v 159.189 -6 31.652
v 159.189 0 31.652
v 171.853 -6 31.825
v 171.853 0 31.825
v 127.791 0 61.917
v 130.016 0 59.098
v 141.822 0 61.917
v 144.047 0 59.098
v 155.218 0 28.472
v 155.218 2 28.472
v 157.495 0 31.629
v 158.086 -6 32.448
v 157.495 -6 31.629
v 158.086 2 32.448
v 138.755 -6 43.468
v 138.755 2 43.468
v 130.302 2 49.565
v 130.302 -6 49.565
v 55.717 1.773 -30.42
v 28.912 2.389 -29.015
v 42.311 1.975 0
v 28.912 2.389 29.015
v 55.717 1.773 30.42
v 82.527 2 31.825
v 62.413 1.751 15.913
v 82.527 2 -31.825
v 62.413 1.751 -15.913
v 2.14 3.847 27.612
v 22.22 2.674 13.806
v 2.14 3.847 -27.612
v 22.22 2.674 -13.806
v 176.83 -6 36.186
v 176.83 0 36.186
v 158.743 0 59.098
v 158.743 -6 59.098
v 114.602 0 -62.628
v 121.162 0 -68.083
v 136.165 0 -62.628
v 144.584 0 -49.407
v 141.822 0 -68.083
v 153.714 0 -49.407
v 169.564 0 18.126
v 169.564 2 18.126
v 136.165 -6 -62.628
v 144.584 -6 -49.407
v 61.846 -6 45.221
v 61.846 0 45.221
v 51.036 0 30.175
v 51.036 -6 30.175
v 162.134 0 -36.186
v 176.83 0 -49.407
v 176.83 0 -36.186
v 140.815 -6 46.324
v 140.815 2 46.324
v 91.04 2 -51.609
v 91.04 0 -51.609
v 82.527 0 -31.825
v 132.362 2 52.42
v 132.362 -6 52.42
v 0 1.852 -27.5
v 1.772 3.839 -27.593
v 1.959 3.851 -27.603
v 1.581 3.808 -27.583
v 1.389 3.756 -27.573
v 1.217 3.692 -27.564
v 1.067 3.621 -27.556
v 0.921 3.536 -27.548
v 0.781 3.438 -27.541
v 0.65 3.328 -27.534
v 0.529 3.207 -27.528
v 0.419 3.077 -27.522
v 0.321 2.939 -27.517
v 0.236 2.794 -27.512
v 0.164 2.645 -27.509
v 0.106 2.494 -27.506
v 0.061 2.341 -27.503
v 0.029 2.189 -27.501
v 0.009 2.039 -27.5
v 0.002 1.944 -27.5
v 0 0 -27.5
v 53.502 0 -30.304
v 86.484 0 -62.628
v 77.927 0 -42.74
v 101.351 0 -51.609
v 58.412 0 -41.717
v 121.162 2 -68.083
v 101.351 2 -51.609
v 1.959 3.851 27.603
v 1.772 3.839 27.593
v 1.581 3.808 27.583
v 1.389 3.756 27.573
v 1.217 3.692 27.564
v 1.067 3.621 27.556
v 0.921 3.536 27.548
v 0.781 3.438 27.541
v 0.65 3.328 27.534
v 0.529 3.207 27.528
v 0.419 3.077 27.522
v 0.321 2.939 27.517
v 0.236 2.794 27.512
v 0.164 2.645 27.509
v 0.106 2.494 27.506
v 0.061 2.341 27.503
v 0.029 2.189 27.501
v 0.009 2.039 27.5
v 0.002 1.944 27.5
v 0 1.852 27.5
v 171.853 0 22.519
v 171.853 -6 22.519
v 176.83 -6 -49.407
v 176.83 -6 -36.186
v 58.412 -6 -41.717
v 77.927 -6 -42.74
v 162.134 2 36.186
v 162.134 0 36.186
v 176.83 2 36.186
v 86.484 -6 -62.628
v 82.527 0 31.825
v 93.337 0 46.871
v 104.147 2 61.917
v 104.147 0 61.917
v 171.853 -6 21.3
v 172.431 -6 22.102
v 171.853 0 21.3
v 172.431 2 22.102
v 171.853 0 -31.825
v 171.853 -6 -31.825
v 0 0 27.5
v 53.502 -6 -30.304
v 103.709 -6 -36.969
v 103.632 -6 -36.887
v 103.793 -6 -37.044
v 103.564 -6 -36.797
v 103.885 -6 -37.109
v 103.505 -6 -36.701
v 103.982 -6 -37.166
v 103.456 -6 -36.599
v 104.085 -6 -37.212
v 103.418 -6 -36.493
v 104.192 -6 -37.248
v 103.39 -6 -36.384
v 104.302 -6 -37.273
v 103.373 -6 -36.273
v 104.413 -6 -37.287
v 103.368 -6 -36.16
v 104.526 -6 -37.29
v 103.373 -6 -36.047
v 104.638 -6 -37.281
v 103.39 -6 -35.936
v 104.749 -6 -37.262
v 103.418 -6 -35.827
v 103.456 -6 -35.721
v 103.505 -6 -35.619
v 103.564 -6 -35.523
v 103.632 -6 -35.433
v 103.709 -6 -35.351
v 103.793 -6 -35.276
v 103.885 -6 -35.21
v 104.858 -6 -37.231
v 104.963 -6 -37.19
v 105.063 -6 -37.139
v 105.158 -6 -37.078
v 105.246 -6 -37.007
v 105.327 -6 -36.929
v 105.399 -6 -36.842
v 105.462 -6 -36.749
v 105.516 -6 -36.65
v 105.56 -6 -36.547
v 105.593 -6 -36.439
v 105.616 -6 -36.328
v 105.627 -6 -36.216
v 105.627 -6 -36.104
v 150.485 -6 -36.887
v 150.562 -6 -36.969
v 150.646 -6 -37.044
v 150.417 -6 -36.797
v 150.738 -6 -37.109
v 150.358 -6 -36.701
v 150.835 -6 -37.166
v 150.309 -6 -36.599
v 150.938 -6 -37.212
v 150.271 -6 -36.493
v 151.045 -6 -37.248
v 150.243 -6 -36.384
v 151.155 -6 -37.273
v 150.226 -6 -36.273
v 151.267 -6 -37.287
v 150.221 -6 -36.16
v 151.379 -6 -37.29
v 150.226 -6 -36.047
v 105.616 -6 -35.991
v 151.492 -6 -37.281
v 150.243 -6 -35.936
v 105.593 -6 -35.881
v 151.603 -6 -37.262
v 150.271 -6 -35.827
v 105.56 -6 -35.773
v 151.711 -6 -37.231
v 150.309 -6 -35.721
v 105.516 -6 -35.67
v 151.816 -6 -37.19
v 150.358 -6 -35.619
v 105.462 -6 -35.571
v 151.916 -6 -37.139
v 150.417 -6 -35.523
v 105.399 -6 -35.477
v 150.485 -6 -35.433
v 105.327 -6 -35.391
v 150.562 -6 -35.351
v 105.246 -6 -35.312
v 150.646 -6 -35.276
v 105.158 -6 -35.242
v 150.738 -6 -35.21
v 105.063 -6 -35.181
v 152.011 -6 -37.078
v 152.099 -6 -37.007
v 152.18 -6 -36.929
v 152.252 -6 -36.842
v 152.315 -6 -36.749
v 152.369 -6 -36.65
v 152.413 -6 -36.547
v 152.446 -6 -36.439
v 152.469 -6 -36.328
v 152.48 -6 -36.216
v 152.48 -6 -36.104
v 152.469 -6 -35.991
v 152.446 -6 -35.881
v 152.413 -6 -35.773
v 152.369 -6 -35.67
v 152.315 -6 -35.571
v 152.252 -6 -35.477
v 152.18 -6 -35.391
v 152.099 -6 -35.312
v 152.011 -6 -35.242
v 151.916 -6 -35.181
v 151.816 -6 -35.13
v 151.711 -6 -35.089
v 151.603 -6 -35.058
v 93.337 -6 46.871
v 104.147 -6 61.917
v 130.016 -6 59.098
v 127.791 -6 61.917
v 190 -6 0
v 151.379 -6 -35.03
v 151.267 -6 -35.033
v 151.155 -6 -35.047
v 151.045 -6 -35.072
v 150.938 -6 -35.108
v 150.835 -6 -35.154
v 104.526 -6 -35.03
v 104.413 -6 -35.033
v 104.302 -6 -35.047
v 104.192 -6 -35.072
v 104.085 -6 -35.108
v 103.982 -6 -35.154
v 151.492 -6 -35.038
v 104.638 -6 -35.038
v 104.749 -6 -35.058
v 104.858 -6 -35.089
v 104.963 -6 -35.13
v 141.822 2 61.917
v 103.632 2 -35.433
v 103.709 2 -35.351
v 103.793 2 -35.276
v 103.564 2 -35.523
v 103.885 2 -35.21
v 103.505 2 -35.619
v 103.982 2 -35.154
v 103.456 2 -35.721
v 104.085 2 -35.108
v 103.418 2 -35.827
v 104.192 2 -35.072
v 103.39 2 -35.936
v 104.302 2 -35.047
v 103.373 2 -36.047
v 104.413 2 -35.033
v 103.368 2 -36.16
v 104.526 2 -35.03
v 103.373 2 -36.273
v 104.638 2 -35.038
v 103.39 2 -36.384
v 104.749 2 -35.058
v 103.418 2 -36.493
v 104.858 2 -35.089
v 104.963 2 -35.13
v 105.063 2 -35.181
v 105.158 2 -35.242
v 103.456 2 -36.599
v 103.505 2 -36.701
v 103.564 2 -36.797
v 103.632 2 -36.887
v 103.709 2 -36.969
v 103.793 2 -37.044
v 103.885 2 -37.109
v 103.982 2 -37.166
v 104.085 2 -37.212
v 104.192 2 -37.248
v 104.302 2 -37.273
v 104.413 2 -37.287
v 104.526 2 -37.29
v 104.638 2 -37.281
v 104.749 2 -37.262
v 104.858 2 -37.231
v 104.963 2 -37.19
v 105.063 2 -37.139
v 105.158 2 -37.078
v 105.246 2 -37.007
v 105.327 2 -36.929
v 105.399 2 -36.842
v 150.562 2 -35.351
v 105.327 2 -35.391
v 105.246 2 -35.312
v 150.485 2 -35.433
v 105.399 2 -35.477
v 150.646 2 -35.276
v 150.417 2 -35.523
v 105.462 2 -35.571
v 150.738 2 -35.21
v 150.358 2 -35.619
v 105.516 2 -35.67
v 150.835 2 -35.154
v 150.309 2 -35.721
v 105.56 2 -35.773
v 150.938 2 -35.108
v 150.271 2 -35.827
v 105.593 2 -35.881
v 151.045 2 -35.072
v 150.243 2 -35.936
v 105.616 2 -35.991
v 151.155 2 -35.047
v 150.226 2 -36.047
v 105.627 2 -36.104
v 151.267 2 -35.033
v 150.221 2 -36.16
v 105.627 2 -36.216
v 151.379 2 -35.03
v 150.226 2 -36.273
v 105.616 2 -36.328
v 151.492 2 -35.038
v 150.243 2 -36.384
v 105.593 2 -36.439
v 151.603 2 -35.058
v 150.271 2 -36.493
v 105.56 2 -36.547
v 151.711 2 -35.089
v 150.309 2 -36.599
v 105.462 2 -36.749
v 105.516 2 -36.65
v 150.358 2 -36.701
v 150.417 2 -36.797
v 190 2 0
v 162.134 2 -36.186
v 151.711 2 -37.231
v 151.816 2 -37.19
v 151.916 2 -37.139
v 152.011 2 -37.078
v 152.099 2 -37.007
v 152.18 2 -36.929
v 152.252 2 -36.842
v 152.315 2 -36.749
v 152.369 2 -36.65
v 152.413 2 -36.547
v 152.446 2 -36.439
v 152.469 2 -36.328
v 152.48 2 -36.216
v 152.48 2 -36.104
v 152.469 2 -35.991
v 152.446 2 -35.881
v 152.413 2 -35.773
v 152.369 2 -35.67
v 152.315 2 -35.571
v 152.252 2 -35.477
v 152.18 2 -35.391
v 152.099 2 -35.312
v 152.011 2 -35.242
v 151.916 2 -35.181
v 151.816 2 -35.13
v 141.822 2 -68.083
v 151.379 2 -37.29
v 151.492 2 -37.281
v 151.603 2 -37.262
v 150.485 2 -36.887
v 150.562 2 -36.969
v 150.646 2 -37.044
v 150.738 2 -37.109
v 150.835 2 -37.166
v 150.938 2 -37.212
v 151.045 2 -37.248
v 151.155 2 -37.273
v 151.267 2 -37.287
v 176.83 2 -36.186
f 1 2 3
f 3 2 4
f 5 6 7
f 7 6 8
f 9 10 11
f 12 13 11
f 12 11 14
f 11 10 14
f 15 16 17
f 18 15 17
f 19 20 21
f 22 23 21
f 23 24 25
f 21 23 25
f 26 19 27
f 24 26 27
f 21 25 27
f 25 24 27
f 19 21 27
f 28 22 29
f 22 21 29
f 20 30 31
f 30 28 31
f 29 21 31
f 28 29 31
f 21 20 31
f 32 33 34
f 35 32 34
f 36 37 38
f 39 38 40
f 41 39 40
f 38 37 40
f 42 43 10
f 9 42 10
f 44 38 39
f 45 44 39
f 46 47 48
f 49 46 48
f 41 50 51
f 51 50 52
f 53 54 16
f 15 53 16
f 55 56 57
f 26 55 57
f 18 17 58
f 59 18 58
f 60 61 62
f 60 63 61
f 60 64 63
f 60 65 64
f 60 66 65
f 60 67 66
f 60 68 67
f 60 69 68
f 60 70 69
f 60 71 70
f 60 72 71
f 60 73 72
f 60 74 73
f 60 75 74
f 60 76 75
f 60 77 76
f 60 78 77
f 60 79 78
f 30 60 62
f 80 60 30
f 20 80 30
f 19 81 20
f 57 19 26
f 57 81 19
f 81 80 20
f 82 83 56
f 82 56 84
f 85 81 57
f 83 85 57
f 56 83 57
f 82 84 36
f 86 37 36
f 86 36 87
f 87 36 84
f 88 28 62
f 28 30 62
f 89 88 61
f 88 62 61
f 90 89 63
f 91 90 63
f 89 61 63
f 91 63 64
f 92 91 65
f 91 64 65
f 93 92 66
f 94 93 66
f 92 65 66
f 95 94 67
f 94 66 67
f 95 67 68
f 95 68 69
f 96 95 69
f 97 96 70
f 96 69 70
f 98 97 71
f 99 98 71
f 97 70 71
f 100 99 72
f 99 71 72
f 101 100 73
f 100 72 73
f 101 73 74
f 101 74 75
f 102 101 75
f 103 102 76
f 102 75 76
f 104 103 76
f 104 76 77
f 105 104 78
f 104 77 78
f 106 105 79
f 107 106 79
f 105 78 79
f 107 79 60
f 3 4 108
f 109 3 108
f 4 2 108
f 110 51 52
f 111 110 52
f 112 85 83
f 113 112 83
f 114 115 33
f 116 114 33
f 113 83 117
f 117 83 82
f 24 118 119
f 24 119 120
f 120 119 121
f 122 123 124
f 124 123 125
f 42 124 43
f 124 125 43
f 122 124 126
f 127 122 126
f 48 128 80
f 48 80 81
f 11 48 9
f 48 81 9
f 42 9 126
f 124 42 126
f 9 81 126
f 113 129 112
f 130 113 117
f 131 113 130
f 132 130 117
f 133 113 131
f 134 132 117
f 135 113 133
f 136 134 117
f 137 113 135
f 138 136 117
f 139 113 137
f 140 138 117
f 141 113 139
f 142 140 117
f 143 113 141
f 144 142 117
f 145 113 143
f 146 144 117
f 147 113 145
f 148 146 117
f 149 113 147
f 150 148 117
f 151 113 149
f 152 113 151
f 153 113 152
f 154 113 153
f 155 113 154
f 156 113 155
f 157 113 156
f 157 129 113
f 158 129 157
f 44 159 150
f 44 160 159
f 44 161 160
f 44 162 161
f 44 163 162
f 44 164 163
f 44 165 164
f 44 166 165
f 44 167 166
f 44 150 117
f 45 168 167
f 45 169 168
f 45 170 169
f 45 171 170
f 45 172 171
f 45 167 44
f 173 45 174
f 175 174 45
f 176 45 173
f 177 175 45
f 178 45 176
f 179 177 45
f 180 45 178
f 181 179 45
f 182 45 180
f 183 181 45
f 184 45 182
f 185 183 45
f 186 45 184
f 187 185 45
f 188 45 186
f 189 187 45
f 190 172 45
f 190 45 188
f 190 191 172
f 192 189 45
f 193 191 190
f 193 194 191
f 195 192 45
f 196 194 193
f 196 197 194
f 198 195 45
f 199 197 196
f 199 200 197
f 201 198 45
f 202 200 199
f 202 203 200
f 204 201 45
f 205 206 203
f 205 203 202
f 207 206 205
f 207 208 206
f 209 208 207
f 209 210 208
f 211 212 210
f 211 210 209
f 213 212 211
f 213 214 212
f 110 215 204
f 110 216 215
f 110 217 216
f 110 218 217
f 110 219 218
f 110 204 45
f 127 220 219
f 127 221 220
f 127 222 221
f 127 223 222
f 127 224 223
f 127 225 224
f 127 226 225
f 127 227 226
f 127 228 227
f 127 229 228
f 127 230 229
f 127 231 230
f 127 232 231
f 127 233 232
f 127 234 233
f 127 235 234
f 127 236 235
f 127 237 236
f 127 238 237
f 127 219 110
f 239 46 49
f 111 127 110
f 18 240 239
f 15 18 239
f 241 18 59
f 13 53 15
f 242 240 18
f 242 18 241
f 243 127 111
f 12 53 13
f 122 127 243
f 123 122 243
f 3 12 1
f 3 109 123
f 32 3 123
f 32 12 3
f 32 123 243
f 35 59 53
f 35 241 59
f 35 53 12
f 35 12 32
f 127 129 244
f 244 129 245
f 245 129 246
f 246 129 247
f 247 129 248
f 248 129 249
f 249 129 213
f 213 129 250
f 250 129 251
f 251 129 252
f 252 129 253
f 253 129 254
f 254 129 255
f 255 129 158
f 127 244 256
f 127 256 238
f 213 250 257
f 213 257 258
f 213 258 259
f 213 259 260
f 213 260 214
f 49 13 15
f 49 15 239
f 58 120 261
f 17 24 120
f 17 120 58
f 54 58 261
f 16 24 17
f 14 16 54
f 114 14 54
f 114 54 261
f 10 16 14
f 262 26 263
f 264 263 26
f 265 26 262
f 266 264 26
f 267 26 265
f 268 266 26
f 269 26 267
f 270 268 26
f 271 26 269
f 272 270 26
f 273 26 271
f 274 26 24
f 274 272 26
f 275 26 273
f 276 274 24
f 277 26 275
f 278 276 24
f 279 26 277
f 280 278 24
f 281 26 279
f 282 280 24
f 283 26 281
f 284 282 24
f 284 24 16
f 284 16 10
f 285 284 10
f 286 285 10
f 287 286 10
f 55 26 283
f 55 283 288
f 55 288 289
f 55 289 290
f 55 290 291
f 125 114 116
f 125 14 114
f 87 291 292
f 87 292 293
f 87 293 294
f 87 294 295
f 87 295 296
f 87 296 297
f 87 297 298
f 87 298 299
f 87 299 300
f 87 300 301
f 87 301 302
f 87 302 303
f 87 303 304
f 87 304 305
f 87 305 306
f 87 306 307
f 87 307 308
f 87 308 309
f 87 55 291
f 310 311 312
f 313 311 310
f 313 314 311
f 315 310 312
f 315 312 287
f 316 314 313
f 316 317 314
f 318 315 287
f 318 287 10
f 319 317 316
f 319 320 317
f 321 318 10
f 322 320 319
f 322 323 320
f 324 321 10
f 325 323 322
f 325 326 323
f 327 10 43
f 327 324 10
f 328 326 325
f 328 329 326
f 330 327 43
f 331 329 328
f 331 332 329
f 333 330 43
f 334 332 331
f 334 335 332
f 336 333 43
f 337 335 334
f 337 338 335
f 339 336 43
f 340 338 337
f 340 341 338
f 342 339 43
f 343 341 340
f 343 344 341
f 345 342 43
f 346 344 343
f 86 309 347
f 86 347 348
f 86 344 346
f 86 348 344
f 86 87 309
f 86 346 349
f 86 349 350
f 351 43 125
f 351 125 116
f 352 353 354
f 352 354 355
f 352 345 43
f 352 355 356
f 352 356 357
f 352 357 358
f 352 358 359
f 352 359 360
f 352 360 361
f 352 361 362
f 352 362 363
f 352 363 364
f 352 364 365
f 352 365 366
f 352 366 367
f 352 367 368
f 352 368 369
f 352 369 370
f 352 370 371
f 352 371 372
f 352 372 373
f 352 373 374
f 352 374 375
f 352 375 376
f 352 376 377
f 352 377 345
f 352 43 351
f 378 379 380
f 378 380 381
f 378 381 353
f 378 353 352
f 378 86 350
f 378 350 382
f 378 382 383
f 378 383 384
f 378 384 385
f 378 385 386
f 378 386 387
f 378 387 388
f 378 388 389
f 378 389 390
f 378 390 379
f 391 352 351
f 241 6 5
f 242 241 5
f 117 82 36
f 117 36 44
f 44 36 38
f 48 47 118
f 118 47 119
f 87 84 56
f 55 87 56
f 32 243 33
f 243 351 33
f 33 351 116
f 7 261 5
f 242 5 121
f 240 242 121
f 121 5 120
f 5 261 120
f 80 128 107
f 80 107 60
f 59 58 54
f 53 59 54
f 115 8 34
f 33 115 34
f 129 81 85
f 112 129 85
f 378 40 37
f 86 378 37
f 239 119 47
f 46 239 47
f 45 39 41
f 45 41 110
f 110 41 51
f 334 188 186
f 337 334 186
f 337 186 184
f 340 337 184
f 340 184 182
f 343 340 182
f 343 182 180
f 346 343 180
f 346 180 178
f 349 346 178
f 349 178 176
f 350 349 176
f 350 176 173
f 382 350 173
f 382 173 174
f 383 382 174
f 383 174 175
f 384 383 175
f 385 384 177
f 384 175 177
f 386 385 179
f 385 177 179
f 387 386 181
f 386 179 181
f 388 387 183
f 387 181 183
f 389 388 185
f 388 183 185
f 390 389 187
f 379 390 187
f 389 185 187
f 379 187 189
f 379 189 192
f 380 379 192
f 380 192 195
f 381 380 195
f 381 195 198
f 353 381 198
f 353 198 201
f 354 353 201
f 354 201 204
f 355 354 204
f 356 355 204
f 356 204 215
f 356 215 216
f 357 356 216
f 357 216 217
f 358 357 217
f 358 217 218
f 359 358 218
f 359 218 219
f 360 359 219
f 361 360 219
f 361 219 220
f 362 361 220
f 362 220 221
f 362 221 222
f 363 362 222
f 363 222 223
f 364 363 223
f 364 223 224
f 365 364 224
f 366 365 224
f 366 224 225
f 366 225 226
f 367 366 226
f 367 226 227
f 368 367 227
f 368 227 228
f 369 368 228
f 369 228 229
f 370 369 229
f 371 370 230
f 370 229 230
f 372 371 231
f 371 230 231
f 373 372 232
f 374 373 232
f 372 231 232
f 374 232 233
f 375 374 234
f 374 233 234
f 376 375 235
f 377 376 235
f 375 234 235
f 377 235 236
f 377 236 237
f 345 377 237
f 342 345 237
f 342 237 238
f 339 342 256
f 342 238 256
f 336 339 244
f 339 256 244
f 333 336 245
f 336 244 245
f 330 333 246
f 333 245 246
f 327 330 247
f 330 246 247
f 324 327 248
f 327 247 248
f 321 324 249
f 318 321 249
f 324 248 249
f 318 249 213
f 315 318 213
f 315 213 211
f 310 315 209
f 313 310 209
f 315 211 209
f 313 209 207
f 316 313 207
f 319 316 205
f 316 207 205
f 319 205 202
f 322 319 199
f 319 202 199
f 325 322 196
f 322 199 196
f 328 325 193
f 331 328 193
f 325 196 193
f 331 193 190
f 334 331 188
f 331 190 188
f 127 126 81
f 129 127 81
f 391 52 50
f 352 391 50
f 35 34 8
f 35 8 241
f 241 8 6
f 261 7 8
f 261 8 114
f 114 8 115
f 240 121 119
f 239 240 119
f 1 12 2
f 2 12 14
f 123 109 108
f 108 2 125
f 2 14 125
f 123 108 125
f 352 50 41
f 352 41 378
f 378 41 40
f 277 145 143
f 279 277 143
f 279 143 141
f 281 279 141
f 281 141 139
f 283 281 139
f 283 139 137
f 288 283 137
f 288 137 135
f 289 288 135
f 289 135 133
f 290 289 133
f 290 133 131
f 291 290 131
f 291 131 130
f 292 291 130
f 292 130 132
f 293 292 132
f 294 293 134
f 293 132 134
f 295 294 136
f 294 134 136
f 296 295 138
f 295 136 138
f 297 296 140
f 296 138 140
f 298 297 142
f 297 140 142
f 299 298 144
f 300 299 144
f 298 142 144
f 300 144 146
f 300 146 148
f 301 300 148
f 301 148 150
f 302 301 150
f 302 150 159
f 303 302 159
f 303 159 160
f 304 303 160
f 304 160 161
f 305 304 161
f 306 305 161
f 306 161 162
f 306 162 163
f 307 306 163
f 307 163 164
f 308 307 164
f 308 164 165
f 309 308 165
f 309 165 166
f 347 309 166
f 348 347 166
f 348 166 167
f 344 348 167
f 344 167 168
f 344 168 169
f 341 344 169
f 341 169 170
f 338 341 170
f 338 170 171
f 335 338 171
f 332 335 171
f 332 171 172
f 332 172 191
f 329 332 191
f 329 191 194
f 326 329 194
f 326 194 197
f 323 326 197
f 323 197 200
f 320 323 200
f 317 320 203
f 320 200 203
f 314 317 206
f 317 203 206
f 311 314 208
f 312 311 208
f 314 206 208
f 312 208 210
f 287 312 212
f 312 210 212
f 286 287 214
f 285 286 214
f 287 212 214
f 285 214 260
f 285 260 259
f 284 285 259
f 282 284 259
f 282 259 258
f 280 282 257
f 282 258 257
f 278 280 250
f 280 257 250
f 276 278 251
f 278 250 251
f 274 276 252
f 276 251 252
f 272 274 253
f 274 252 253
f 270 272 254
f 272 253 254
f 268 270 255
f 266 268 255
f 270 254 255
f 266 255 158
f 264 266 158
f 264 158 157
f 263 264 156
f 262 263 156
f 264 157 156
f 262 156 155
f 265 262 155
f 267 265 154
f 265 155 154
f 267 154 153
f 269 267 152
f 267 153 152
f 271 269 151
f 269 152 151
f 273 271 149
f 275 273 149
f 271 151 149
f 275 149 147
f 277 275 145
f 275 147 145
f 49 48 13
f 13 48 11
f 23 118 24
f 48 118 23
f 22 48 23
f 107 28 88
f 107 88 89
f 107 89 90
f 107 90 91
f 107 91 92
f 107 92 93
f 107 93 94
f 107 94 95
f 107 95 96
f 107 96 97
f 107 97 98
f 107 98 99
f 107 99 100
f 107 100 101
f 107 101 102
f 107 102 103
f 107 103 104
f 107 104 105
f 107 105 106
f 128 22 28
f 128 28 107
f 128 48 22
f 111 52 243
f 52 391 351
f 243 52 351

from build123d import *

# Parameters (mm, degrees)
EXTRUDE_1_DEPTH          = 2
EXTRUDE_2_DEPTH          = 2
CUT_EXTRUDE_3_DEPTH      = 202.869395429
CUT_EXTRUDE_3_DEPTH_BACK = 202.869395429
FILLET_1_R               = 2
EXTRUDE_4_DEPTH          = 6
HOLE_WIZARD_4_40_2_D     = 2.2606
CUT_EXTRUDE_7_DEPTH      = 202.98824919


with BuildPart() as part:
    # 草图2 → 凸台-拉伸1 (new body)
    with BuildSketch(Plane(origin=(0, 0, 0), x_dir=(1, 0, 0), z_dir=(0, 1, 0))):
        Polygon((141.821582241, 68.082690978), (121.161879345, 68.082690978), (101.35099463, 51.608897425), (91.039832206, 51.608897425), (82.527346571, 31.825074964), (0, 27.5), (0, -27.5), (82.527346571, -31.825074964), (104.14664553, -61.917309022), (141.821582241, -61.917309022), (162.133732132, -36.18552755), (176.829545061, -36.18552755), (190, 0), (176.829545061, 36.18552755), (162.133732132, 36.18552755), align=None)
    extrude(amount=EXTRUDE_1_DEPTH)

    # 草图6 → 凸台-拉伸2 (add)
    with BuildSketch(Plane(origin=(0, 2, 0), x_dir=(1, 0, 0), z_dir=(0, 1, 0))):
        Polygon((82.527346571, 31.825074964), (82.527346571, -31.825074964), (0, -27.5), (0, 27.5), align=None)
    extrude(amount=EXTRUDE_2_DEPTH)

    # 草图7 → 切除-拉伸3 (cut, two sides: drawn at the far end of the back side and taken through both)
    with BuildSketch(Plane.XY.offset(-CUT_EXTRUDE_3_DEPTH_BACK)):
        with BuildLine():
            Line((82.527346571, 2), (82.527346571, 30.740821148))
            Line((82.527346571, 30.740821148), (0, 4))
            add(Edge.make_bspline(
                [(82.527346571, 2), (41.215261335, 1.001172546), (0, 4)],
                knots=[0, 0, 0, 1, 1, 1], degree=2))
        make_face()
    extrude(amount=CUT_EXTRUDE_3_DEPTH + CUT_EXTRUDE_3_DEPTH_BACK, mode=Mode.SUBTRACT)

    # 圆角1
    fillet_1_edges = [part.edges().sort_by_distance(p)[0] for p in [
        (0, 4, 13.75),
    ]]
    fillet(fillet_1_edges, radius=FILLET_1_R)

    # 草图13 → 凸台-拉伸4 (add)
    with BuildSketch(Plane.XZ):
        Polygon((53.501507434, -30.303895193), (58.412275987, -41.716986195), (77.926898746, -42.739704237), (86.484415452, -62.62818317), (136.164724768, -62.62818317), (144.584081331, -49.40685536), (176.829545061, -49.40685536), (176.829545061, -36.18552755), (190, 0), (176.829545061, 36.18552755), (158.743204348, 59.097615602), (130.016377906, 59.097615602), (127.790568727, 61.917309022), (104.14664553, 61.917309022), (93.336996051, 46.871191993), (61.845926158, 45.220814953), (51.036276678, 30.174697924), (171.852914921, 31.825074964), (171.852914921, -31.825074964), align=None)
    extrude(amount=EXTRUDE_4_DEPTH)

    # #4-40 螺纹孔2 (through all)
    with Locations(Plane(origin=(0, 2, 0), x_dir=(1, 0, 0), z_dir=(0, 1, 0))):
        with Locations((151.351021218, 36.159959894), (104.497931561, 36.159959894)):
            Hole(HOLE_WIZARD_4_40_2_D / 2)

    # 草图18 → 切除-拉伸7 (cut, through all)
    with BuildSketch(Plane(origin=(0, 2, 0), x_dir=(1, 0, 0), z_dir=(0, 1, 0))):
        Polygon((169.563862496, -18.125868021), (155.218286362, -28.471875769), (158.085778721, -32.447885738), (172.431354854, -22.101877989), align=None)
        Polygon((130.302091903, -49.564637909), (132.361562224, -52.420260001), (140.814695434, -46.323873151), (138.755225113, -43.468251059), align=None)
    extrude(amount=-CUT_EXTRUDE_7_DEPTH, mode=Mode.SUBTRACT)


solid = part.part
